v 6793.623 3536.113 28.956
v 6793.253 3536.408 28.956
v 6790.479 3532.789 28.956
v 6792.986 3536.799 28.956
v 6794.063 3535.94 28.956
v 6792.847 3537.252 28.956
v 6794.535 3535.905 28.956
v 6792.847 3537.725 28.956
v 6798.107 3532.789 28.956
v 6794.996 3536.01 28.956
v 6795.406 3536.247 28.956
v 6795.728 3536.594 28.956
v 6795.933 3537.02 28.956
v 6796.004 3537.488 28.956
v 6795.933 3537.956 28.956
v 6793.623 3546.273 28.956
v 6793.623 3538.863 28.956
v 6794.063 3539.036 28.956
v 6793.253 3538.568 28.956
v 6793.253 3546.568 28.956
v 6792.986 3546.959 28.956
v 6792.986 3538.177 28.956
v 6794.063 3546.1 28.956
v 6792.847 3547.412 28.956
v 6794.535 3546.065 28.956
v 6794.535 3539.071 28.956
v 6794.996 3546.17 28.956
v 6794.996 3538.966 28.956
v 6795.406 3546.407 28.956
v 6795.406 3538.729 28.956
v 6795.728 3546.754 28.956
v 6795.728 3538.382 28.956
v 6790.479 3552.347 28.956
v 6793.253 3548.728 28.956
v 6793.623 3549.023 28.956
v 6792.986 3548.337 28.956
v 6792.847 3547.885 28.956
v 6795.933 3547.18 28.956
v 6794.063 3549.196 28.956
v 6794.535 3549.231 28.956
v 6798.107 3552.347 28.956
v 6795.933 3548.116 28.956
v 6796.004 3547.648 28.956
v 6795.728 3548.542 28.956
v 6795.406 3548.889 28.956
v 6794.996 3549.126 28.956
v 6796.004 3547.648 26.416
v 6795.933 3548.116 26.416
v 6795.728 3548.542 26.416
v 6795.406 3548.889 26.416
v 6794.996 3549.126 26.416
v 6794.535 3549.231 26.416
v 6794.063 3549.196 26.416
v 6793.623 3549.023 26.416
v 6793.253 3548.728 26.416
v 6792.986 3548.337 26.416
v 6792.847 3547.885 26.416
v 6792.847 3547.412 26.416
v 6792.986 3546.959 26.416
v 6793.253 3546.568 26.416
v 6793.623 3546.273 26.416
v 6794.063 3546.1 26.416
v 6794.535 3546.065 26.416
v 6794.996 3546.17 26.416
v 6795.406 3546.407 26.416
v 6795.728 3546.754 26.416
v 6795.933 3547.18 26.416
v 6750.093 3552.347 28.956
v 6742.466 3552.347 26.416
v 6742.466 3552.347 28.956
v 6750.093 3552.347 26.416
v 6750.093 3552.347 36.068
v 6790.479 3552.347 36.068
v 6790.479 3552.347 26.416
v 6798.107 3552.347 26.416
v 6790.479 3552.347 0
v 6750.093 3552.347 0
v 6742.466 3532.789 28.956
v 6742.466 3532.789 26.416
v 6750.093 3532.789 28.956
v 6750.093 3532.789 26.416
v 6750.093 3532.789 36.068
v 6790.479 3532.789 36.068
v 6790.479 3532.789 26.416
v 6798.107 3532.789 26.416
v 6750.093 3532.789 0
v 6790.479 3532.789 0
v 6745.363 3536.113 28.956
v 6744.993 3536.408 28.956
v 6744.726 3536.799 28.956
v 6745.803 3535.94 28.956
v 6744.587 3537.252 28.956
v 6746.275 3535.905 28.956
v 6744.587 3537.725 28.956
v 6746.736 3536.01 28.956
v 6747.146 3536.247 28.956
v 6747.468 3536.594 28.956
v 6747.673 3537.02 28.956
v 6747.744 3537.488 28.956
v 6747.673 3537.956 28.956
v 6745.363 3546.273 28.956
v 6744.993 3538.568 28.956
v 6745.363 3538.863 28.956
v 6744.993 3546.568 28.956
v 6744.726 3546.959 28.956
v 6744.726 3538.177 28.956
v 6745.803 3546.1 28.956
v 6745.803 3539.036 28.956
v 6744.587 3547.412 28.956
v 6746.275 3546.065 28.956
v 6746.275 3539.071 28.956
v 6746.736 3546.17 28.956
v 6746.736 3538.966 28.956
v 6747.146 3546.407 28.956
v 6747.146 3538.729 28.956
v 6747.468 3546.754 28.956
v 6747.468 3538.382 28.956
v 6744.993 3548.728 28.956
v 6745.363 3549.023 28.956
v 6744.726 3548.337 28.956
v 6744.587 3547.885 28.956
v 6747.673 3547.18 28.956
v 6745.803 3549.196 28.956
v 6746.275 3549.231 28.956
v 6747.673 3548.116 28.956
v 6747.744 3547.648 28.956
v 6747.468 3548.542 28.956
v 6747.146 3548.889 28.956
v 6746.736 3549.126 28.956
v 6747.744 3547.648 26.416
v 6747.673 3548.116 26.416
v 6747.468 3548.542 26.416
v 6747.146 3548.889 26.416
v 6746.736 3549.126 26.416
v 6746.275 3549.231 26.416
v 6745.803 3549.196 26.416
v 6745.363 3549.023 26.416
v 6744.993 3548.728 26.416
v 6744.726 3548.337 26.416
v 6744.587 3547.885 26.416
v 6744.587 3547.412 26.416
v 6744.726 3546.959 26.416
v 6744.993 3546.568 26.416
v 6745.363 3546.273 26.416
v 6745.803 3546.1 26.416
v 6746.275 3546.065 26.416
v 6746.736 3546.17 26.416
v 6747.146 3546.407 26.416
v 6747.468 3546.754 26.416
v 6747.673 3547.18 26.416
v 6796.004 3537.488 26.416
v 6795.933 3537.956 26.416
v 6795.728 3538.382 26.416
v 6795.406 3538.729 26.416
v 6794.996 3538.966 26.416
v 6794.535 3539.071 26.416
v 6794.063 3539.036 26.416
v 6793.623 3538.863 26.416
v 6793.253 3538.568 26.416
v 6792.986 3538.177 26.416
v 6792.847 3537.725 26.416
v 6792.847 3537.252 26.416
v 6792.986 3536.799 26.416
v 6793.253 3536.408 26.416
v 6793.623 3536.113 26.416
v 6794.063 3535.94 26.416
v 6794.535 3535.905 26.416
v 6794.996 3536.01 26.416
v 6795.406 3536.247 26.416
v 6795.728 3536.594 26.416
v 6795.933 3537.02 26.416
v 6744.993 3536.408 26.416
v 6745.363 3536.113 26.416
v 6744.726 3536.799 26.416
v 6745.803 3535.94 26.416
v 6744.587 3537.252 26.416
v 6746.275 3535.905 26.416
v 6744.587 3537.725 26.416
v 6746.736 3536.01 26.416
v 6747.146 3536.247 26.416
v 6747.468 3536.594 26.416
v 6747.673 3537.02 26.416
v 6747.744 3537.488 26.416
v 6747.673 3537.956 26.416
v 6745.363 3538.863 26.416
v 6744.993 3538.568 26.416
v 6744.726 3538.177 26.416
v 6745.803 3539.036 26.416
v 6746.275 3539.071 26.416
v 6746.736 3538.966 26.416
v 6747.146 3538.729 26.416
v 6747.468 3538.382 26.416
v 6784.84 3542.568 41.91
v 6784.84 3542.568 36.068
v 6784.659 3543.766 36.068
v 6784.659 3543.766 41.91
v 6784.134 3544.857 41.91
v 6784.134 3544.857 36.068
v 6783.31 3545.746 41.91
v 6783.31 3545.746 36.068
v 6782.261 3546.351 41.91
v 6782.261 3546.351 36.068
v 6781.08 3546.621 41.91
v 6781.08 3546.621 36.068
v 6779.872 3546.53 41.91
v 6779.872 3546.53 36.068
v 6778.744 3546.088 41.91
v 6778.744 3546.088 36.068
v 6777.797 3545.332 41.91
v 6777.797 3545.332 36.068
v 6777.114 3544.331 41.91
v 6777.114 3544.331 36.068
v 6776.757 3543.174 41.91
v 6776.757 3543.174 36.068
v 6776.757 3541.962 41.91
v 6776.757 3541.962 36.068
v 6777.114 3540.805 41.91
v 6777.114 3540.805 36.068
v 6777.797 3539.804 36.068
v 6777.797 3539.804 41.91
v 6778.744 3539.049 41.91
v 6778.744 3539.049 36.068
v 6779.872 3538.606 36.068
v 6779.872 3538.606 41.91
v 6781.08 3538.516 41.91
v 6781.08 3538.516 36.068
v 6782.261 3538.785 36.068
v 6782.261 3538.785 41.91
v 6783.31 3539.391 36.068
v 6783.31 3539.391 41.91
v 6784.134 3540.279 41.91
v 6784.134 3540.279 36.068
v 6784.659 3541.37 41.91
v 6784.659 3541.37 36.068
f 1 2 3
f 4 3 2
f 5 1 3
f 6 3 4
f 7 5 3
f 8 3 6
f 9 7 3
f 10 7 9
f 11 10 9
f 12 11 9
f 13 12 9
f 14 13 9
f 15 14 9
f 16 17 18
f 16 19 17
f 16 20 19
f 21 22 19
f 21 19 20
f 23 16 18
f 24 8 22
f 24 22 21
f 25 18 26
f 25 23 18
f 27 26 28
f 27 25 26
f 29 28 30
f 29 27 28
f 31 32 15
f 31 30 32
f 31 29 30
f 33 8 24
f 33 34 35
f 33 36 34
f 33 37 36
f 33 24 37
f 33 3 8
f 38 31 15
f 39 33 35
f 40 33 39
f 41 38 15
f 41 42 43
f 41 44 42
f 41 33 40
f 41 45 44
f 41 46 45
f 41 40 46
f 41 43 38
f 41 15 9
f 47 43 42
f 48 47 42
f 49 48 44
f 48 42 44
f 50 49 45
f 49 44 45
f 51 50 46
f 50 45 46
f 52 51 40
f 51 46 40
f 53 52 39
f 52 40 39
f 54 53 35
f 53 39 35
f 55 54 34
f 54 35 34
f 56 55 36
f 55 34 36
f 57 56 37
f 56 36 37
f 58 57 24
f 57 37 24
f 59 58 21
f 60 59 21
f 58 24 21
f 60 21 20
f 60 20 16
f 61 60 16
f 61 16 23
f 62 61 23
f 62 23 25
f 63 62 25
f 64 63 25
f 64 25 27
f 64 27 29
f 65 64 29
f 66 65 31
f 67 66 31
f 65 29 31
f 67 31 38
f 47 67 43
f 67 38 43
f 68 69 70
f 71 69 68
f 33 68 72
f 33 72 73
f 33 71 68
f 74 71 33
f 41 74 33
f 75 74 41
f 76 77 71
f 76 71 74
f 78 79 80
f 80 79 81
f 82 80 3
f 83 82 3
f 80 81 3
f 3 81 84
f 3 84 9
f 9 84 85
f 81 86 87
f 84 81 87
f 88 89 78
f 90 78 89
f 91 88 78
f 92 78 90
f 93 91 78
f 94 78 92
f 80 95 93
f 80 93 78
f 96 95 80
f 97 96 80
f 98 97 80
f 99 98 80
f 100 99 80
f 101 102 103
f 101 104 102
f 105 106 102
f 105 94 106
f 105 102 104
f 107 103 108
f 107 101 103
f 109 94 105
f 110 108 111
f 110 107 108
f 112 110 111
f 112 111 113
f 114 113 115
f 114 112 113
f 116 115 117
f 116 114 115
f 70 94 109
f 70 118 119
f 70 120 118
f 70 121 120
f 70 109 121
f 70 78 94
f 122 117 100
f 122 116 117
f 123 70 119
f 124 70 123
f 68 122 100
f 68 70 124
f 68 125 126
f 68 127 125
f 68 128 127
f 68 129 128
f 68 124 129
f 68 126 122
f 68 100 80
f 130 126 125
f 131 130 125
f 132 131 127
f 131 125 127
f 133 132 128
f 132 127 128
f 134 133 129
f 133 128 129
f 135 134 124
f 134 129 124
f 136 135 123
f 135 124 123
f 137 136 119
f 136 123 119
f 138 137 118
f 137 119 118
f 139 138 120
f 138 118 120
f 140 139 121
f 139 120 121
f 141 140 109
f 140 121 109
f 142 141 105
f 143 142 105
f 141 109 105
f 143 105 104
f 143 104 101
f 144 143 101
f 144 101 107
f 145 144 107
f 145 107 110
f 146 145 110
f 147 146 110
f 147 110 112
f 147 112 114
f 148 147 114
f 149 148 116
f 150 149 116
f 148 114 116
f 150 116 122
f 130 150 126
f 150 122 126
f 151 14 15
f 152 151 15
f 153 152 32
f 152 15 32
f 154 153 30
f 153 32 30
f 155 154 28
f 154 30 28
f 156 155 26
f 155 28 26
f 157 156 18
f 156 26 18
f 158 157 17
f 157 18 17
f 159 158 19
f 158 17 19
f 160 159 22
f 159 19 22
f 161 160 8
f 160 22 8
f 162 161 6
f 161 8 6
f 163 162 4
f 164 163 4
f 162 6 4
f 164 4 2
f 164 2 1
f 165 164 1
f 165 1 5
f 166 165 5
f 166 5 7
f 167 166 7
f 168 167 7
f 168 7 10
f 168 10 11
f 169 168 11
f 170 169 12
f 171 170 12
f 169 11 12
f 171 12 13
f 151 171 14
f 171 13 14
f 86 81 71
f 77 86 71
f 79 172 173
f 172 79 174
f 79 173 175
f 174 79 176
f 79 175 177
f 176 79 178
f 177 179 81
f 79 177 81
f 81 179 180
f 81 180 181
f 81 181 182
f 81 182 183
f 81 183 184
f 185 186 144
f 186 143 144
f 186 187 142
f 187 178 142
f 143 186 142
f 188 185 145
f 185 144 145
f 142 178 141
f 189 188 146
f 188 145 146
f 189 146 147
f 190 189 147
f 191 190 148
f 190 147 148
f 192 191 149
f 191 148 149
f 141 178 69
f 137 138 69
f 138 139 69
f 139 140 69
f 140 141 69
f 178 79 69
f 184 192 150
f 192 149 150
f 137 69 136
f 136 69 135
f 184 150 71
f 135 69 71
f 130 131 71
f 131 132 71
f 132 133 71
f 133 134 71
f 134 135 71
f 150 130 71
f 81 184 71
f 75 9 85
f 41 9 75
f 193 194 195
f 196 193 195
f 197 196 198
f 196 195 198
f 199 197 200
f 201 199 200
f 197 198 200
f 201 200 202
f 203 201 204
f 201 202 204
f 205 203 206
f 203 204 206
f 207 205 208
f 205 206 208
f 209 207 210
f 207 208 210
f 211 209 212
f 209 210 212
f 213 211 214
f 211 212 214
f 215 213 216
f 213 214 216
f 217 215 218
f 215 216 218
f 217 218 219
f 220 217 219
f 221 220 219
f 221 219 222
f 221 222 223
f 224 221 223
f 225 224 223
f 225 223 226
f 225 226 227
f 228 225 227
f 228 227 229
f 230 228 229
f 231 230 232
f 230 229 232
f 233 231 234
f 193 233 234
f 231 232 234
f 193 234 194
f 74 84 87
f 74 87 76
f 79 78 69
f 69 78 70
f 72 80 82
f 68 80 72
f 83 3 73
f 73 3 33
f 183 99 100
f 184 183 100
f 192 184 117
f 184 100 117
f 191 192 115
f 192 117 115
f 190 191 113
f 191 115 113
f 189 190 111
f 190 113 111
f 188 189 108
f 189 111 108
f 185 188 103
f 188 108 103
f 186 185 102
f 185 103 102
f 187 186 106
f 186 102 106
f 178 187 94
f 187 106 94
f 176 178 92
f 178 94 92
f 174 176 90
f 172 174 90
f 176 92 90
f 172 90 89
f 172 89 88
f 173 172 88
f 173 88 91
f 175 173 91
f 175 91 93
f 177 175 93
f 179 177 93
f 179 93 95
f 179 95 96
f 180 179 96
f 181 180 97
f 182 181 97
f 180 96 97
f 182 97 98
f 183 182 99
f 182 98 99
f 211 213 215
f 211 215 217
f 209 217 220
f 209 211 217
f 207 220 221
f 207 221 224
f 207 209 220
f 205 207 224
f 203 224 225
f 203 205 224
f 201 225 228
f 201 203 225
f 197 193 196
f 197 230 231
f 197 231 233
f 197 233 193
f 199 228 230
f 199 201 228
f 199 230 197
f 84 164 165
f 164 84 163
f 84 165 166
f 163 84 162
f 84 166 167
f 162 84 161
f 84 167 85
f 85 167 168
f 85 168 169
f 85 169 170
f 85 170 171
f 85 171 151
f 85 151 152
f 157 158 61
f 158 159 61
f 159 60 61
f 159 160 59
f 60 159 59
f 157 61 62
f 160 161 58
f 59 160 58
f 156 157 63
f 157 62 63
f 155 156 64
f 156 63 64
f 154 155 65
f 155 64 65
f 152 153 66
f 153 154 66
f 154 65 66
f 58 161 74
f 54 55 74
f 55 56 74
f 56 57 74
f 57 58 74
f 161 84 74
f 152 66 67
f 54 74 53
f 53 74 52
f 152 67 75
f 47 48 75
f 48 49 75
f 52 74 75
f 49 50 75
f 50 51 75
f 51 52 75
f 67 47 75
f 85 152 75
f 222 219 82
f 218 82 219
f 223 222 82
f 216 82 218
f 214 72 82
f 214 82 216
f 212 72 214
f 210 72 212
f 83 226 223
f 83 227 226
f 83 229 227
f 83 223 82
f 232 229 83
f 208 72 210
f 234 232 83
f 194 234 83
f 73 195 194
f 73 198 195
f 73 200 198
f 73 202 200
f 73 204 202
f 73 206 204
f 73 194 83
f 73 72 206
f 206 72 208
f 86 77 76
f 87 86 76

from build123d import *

# Parameters (mm, degrees)
SKETCH1_W           = 40.386
SKETCH1_H           = 19.558
BOSS_EXTRUDE1_DEPTH = 36.068
SKETCH2_W           = 7.627483077
SKETCH2_H           = 19.558
SKETCH2_R           = 1.5875
SKETCH2_W_2         = 7.627483076
BOSS_EXTRUDE2_DEPTH = 2.54
SKETCH3_R           = 4.064
BOSS_EXTRUDE3_DEPTH = 5.842


with BuildPart() as part:
    # Sketch1 → Boss-Extrude1 (new body)
    with BuildSketch(Plane.XY):
        with Locations((6770.286327778, 3542.568139787)):
            Rectangle(SKETCH1_W, SKETCH1_H)
    extrude(amount=BOSS_EXTRUDE1_DEPTH)

    # Sketch2 → Boss-Extrude2 (add)
    # profile 1 of 2: a face of its own
    with BuildSketch(Plane.XY.offset(28.956)):
        with Locations((6794.293069316, 3542.568139787)):
            Rectangle(SKETCH2_W, SKETCH2_H)
        with Locations((6794.416327778, 3537.488139787)):
            Circle(SKETCH2_R, mode=Mode.SUBTRACT)
        with Locations((6794.416327778, 3547.648139787)):
            Circle(SKETCH2_R, mode=Mode.SUBTRACT)
    # profile 2 of 2: a face of its own
    with BuildSketch(Plane.XY.offset(28.956)):
        with Locations((6746.27958624, 3542.568139787)):
            Rectangle(SKETCH2_W_2, SKETCH2_H)
        with Locations((6746.156327778, 3547.648139787)):
            Circle(SKETCH2_R, mode=Mode.SUBTRACT)
        with Locations((6746.156327778, 3537.488139787)):
            Circle(SKETCH2_R, mode=Mode.SUBTRACT)
    extrude(amount=-BOSS_EXTRUDE2_DEPTH)

    # Sketch3 → Boss-Extrude3 (add)
    with BuildSketch(Plane.XY.offset(36.068)):
        with Locations((6780.775840345, 3542.568139787)):
            Circle(SKETCH3_R)
    extrude(amount=BOSS_EXTRUDE3_DEPTH)


solid = part.part
